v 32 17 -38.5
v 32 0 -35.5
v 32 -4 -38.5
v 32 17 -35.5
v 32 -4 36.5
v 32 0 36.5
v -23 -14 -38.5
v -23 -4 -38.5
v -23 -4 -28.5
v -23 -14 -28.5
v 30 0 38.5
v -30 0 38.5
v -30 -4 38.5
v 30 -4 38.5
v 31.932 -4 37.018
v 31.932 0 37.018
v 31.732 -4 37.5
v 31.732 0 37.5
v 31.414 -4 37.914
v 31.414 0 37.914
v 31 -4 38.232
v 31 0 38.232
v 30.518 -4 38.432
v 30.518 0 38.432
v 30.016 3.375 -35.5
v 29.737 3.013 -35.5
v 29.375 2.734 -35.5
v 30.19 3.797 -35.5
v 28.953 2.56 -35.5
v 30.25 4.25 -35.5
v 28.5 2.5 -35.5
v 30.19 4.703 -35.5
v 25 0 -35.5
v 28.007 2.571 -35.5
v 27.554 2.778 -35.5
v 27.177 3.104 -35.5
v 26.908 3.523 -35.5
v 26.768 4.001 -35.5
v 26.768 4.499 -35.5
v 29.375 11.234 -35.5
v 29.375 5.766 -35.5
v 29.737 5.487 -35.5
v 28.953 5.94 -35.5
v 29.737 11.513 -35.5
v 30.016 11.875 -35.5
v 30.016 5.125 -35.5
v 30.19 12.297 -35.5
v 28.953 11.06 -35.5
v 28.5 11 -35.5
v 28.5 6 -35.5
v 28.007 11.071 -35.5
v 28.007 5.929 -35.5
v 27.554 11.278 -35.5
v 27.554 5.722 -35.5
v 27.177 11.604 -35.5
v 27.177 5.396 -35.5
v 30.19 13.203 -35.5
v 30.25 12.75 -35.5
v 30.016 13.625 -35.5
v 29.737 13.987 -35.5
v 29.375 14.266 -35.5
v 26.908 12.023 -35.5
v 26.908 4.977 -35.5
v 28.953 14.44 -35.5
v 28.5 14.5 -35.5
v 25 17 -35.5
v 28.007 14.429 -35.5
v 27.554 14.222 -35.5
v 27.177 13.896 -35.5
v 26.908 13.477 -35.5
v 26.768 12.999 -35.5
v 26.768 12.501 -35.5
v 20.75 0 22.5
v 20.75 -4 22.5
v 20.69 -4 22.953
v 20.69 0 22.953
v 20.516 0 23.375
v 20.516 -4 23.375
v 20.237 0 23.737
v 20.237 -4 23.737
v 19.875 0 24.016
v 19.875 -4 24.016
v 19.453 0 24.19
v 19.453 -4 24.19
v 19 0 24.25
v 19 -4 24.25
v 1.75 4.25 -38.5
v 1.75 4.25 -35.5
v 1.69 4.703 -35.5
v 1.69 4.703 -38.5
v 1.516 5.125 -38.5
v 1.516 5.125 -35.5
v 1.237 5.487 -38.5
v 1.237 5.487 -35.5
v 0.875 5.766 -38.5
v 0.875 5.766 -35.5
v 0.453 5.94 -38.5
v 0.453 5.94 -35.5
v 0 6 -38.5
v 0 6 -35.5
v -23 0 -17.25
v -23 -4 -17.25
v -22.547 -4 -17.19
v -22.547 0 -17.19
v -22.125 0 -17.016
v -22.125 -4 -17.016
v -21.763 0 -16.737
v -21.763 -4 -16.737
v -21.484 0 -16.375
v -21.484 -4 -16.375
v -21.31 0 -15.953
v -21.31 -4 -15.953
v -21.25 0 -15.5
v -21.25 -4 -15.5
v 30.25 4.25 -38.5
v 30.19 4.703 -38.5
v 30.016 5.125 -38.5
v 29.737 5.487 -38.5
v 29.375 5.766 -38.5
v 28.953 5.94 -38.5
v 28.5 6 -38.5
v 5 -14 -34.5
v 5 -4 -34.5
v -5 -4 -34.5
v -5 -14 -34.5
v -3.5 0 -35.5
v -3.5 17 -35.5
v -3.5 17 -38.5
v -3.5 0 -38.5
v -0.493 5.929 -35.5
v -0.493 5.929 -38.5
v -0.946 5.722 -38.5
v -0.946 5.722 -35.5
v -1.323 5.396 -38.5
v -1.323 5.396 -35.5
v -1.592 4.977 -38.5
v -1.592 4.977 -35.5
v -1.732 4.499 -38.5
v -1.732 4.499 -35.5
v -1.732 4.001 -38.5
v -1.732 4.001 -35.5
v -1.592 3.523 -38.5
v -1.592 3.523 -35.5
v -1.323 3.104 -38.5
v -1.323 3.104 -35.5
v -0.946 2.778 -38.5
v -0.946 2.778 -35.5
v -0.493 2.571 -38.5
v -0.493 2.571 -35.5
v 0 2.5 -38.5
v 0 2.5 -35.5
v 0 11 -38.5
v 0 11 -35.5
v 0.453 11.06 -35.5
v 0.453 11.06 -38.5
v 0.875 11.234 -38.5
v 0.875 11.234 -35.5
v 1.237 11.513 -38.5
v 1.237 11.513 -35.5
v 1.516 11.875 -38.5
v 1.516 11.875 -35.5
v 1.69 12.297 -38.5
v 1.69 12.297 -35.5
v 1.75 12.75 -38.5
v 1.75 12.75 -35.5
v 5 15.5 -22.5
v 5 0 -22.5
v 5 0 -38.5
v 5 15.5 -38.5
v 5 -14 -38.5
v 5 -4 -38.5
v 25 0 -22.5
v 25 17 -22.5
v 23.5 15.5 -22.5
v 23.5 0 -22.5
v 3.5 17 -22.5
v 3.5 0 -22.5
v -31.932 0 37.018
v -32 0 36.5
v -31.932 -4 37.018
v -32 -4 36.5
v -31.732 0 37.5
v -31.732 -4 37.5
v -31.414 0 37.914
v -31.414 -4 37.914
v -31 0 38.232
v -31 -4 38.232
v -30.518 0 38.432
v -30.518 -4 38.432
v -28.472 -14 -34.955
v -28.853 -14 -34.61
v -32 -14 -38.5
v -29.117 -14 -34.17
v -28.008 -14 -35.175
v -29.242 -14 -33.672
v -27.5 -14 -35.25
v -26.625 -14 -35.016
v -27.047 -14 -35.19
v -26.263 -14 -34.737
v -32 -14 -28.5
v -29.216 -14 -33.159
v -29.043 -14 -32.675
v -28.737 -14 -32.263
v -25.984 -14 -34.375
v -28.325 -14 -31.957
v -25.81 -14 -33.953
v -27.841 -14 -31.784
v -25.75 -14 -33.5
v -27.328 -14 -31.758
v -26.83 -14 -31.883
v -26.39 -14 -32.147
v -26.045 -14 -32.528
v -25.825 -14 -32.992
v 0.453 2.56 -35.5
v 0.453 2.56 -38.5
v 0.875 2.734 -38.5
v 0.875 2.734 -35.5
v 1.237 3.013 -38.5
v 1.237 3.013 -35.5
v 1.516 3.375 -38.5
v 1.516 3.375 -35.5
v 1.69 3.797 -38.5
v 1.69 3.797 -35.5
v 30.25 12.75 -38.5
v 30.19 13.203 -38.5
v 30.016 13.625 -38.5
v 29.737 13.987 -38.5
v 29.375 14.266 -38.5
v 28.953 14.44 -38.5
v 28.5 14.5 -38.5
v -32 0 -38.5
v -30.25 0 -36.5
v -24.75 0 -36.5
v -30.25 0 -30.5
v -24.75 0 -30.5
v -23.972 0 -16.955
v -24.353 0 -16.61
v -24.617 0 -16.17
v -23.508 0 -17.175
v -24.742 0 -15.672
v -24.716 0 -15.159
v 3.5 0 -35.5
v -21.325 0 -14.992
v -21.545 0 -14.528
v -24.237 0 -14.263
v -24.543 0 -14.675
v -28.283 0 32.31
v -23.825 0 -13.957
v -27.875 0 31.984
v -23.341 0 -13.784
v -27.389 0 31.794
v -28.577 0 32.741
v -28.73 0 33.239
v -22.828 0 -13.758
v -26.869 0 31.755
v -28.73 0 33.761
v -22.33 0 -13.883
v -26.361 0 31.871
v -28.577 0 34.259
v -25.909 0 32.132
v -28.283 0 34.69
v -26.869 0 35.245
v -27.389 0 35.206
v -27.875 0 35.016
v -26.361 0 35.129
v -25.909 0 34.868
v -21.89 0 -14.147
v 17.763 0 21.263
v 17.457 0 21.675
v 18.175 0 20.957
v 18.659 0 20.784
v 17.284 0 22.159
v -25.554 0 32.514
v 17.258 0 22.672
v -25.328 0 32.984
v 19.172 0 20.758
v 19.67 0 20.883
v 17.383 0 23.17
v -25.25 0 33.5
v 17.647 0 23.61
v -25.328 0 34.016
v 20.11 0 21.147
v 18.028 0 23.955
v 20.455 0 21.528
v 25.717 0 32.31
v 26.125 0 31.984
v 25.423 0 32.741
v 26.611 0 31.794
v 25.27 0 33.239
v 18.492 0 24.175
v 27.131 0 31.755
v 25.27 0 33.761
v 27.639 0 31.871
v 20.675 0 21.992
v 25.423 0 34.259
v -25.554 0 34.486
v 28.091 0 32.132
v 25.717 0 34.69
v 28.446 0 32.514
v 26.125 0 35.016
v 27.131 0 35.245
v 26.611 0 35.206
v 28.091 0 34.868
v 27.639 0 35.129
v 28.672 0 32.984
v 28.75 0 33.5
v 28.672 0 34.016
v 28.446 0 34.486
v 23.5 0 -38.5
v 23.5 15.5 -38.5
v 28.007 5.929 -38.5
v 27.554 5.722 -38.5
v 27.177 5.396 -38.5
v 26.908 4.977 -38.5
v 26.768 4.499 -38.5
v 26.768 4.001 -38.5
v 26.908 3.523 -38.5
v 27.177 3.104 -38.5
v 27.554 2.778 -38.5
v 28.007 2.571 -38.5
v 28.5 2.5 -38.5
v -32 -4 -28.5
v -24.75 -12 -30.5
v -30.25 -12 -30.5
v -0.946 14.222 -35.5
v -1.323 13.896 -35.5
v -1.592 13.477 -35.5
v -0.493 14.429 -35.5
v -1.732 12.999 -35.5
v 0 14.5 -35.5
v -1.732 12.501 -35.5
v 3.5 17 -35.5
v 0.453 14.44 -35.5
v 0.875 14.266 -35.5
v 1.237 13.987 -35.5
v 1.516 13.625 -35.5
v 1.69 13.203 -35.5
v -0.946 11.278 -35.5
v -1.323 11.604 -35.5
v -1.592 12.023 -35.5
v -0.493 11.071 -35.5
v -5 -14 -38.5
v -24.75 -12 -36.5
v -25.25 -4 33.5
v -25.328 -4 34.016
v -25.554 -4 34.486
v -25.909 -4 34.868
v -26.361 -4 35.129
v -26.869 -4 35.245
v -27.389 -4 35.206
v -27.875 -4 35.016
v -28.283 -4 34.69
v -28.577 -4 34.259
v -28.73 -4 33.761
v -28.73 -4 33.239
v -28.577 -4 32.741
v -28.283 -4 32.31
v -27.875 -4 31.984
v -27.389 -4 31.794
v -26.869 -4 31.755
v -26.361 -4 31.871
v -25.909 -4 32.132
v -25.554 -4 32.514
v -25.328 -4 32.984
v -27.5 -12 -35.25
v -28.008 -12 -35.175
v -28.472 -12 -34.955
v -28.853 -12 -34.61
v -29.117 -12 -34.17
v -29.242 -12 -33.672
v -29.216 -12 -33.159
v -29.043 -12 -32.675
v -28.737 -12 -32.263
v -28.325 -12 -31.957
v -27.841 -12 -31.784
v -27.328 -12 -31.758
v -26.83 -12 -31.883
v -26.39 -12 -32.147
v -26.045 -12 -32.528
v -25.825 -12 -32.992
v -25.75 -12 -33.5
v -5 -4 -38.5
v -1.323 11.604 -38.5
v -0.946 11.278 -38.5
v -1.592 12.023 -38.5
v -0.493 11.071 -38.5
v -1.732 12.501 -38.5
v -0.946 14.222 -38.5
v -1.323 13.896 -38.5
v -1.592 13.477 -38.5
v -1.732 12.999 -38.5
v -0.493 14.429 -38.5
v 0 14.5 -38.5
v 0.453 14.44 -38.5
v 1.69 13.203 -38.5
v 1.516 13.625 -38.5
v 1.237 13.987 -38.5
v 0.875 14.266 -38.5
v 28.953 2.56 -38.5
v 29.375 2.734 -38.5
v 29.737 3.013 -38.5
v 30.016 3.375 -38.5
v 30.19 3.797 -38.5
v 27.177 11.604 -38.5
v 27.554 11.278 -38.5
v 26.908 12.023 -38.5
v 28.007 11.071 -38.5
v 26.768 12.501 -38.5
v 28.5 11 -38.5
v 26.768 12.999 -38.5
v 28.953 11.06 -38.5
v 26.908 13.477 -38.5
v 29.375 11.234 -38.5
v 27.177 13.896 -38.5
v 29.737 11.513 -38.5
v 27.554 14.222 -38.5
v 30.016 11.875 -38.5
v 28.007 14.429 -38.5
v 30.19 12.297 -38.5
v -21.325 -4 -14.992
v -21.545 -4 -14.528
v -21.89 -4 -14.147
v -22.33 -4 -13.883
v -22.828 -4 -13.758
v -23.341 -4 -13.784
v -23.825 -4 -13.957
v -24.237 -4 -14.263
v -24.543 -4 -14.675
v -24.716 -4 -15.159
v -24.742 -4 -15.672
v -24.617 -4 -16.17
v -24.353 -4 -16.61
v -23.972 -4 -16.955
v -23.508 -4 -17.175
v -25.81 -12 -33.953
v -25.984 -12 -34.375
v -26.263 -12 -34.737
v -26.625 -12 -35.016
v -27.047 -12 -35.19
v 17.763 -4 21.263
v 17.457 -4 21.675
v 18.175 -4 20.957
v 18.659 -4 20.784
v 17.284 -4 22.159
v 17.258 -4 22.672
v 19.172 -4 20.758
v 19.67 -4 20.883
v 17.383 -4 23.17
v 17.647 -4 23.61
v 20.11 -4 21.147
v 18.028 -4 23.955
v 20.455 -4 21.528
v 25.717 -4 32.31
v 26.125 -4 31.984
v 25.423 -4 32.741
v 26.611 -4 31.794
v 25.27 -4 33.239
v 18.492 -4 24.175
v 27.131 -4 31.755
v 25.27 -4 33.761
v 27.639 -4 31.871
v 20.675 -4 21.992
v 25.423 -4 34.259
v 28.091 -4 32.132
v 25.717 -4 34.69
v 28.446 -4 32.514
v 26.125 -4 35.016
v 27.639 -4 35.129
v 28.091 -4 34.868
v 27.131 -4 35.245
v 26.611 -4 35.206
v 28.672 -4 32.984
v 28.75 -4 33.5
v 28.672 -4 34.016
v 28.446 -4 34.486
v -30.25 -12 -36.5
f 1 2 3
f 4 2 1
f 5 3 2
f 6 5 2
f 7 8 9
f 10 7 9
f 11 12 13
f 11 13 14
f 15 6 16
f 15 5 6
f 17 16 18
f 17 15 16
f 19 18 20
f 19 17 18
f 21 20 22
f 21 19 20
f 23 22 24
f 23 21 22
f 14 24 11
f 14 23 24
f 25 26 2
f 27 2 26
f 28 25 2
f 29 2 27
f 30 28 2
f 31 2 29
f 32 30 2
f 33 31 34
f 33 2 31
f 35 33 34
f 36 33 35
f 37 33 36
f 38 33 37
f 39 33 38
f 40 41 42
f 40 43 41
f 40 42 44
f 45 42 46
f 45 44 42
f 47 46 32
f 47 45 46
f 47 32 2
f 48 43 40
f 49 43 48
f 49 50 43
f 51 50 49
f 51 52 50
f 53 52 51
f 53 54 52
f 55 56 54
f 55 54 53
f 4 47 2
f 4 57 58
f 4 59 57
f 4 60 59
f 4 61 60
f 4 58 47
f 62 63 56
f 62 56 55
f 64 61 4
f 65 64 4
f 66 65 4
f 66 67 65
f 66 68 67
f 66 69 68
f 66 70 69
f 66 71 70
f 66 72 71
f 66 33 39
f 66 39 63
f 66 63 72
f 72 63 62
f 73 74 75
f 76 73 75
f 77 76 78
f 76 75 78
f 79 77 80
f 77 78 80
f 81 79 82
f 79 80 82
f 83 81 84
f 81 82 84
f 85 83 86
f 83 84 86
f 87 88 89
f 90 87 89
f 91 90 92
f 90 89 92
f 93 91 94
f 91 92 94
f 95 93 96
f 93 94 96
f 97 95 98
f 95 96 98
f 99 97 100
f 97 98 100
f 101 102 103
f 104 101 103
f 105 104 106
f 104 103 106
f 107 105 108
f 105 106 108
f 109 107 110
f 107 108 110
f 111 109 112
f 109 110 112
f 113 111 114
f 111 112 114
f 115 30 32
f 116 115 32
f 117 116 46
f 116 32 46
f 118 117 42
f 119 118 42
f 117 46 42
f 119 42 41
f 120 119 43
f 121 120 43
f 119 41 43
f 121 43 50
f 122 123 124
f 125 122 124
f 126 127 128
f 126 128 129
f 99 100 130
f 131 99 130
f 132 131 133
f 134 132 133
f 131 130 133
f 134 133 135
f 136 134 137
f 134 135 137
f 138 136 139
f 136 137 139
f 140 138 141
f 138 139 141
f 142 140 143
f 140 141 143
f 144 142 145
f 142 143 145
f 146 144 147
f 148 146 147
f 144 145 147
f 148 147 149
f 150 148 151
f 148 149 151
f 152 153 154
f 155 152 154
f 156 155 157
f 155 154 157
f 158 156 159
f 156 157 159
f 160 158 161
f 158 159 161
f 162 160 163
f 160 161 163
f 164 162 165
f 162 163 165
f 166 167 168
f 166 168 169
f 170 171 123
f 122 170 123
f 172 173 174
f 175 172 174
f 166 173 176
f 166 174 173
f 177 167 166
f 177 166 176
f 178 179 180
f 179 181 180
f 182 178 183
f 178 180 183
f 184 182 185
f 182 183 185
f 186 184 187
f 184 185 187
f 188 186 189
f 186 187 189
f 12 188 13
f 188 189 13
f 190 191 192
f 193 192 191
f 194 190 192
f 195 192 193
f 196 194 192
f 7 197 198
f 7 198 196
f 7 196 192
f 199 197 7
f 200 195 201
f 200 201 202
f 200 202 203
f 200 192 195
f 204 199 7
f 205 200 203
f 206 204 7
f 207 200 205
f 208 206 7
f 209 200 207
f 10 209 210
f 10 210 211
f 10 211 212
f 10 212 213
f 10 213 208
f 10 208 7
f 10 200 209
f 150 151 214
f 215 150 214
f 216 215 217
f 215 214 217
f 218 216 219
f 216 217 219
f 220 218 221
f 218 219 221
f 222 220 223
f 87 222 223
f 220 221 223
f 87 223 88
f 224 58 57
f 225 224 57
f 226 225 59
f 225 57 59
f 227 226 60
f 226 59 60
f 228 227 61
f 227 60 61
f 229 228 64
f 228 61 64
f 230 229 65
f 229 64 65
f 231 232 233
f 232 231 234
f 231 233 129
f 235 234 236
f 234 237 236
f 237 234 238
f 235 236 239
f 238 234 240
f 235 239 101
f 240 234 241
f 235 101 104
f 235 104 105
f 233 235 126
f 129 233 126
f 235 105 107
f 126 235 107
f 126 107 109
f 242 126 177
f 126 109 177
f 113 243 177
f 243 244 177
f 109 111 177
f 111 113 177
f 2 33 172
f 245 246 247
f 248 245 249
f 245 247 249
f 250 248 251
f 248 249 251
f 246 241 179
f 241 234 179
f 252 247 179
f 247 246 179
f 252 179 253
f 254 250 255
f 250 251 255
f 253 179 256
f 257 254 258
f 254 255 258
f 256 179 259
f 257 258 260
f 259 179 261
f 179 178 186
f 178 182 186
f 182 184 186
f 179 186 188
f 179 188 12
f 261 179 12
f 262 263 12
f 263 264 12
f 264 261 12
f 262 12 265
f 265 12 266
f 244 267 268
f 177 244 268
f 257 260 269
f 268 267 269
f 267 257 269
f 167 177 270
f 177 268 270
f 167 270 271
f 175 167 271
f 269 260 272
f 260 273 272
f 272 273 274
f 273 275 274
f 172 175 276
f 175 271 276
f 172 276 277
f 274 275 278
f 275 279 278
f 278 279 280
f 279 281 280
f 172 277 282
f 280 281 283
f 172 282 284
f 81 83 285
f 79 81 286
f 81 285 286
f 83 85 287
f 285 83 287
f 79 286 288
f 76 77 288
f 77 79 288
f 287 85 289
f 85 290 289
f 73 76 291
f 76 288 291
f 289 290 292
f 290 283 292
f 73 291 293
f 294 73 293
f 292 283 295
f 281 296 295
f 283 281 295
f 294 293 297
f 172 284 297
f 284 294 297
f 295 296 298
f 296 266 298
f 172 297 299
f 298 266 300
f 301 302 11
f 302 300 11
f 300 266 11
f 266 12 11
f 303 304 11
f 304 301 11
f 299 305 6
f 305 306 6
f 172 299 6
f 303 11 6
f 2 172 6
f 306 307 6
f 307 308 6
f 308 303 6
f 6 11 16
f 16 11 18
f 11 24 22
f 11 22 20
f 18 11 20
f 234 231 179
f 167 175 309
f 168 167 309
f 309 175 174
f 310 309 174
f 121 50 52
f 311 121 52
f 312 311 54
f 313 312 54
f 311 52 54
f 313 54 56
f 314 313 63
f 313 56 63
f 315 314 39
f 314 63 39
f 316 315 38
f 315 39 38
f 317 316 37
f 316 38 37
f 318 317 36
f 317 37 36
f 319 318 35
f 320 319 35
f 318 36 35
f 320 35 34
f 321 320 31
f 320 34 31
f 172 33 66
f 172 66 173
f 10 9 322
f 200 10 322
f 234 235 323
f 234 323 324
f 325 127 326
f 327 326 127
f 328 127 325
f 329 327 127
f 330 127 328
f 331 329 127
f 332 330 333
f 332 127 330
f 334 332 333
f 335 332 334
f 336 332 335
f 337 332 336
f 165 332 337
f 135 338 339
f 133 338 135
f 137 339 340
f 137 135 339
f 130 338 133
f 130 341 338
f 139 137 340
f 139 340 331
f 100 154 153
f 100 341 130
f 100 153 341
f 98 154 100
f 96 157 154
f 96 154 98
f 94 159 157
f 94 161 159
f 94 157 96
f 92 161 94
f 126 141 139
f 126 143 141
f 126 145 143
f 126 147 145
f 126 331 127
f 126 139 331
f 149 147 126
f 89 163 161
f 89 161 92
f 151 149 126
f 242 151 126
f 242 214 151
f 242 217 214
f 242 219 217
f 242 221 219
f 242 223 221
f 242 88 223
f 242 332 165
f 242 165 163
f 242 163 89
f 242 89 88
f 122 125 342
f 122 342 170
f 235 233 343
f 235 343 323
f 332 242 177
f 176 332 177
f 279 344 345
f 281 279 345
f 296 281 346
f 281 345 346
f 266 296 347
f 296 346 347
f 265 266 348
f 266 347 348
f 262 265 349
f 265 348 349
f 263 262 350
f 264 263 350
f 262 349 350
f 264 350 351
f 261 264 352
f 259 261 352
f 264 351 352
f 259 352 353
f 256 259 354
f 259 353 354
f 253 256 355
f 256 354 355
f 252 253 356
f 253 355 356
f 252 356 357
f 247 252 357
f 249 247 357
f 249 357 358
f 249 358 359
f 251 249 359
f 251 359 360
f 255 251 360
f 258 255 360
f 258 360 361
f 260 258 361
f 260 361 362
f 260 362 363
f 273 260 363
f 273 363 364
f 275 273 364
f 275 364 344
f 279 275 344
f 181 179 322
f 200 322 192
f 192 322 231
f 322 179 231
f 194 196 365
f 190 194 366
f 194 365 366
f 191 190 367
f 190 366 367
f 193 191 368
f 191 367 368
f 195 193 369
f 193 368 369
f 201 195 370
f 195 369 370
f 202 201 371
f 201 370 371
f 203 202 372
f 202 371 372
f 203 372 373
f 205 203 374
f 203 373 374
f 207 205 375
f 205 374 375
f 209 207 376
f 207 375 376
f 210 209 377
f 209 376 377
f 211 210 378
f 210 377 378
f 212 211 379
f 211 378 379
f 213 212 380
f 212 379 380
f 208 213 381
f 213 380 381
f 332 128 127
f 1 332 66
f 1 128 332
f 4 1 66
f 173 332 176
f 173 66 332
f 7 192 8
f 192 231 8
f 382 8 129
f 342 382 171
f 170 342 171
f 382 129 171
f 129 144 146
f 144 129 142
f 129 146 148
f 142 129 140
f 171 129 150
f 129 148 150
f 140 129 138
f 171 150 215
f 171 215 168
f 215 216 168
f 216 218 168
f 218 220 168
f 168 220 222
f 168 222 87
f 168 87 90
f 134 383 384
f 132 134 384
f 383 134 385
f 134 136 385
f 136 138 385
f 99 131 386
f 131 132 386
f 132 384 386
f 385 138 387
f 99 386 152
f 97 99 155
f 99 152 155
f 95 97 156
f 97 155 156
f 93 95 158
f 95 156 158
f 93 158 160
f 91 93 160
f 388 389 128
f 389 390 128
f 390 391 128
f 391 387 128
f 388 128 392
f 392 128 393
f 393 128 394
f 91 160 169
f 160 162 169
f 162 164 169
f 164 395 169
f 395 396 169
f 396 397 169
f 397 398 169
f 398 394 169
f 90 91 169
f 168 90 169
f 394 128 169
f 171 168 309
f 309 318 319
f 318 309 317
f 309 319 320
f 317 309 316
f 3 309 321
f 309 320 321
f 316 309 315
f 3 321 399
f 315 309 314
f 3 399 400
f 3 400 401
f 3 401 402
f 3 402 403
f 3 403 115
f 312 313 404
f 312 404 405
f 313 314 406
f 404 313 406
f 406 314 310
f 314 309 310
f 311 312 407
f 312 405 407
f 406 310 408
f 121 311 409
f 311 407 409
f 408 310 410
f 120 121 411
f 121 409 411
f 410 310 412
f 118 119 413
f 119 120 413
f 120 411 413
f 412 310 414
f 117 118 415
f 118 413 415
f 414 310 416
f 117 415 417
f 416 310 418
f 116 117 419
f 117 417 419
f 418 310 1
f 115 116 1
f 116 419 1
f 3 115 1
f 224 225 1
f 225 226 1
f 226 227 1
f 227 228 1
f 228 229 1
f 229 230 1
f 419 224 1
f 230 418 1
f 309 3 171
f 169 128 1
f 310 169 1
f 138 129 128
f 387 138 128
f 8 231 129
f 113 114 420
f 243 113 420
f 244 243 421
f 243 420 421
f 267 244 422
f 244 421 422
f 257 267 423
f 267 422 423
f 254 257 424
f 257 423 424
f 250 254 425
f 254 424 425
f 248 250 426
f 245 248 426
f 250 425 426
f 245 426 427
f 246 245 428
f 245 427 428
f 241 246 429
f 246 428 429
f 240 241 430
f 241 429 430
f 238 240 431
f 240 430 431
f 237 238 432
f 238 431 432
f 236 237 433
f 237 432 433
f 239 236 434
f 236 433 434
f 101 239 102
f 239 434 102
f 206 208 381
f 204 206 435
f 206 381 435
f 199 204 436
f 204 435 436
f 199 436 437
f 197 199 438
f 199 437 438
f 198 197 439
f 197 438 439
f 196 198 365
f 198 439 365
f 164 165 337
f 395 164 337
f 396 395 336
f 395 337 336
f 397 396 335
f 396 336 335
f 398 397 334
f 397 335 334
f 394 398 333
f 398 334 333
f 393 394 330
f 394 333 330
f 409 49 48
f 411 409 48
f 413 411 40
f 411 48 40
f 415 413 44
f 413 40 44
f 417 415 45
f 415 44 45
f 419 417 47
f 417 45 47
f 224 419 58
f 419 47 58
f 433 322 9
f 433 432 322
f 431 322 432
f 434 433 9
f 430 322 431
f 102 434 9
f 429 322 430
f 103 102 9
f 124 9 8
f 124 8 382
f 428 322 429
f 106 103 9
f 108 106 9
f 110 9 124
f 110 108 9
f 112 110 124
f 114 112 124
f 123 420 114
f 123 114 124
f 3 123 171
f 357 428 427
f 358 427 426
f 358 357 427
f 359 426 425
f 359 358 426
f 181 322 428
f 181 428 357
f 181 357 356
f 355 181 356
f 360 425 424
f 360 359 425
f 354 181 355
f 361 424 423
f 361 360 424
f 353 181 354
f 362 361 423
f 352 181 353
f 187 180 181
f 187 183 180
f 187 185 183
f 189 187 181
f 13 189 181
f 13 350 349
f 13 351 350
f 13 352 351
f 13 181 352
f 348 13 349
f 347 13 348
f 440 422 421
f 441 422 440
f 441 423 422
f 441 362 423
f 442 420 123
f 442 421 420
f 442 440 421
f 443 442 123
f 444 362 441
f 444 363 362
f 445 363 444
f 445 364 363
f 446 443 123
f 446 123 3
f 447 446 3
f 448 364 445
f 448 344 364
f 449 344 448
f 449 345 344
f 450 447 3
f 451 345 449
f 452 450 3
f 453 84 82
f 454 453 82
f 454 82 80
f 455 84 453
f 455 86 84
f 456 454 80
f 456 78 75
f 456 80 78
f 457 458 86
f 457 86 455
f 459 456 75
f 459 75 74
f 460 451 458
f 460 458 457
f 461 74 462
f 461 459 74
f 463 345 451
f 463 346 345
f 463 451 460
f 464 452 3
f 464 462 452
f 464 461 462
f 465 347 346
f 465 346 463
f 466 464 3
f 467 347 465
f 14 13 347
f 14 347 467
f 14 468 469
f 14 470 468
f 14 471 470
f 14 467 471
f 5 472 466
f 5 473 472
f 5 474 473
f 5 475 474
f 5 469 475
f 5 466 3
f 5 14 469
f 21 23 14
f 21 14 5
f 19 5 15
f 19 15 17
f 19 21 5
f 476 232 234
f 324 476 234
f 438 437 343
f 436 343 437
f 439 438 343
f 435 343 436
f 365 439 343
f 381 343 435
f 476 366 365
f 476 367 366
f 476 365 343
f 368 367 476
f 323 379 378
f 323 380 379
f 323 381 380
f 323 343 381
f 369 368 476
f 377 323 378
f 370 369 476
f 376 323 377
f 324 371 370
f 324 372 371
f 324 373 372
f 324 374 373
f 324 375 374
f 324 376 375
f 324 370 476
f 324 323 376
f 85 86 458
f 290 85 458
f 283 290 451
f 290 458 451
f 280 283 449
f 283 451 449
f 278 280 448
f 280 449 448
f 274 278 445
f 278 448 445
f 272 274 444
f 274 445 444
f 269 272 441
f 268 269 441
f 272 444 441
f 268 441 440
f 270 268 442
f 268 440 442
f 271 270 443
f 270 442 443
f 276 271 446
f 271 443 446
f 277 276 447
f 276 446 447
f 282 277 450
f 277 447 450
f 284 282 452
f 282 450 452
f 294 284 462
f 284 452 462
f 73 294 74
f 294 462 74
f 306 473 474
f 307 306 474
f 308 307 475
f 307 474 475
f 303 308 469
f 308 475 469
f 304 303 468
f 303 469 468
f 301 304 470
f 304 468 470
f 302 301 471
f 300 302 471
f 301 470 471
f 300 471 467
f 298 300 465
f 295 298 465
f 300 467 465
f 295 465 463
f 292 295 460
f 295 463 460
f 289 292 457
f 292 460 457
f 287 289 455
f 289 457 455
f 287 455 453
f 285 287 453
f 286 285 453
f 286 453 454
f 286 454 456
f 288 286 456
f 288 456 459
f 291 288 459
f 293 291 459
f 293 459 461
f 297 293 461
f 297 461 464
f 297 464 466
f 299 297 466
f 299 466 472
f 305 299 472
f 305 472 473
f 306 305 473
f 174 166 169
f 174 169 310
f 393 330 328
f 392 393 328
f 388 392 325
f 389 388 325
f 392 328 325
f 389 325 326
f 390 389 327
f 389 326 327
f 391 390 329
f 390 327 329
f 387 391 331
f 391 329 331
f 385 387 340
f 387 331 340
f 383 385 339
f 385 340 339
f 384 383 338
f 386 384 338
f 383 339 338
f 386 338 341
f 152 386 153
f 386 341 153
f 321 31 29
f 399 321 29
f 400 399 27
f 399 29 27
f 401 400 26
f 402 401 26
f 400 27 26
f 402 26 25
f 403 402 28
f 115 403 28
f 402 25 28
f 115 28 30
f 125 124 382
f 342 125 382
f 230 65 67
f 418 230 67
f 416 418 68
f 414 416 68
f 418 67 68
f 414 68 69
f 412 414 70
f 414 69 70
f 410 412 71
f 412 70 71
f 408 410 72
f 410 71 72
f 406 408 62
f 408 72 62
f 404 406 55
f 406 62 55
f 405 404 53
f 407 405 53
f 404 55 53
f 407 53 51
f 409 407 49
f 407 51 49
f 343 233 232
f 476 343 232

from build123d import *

# Parameters (mm, degrees)
F0_W      = 64
F0_H      = 77
F1_DEPTH  = 4
F2_R      = 1.75
F3_DEPTH  = 25
F5_DEPTH  = 10
F7_DEPTH  = 25
F8_W      = 21.5
F8_H      = 16
F9_DEPTH  = 17
F10_W     = 18.5
F10_H     = 15.5
F11_DEPTH = 25
F12_W     = 17
F12_H     = 3
F13_DEPTH = 7
F14_W     = 17
F14_H     = 3
F15_DEPTH = 7
F17_DEPTH = 25
F19_DEPTH = 25
F21_DEPTH = 10
F22_DEPTH = 25
F23_W     = 5.5
F23_H     = 6
F23_R     = 1.75
F24_DEPTH = 12
F25_R     = 2


# Not quite as in the source:
# - a feature names something its author has since deleted; it is built from what else it names


with BuildPart() as f1:
    # F0 (on Front) → F1 (new body)
    with BuildSketch(Plane.XZ):
        Rectangle(F0_W, F0_H)
    extrude(amount=F1_DEPTH)

    # F2 (on face) → F3 (cut)
    with BuildSketch(Plane.XZ.offset(4)):
        with BuildLine():
            ThreePointArc((-28.75, 33.5), (-27, 31.75), (-25.25, 33.5))
            ThreePointArc((-25.25, 33.5), (-27, 35.25), (-28.75, 33.5))
        make_face()
        with Locations((27, 33.5)):
            Circle(F2_R)
    extrude(amount=-F3_DEPTH, mode=Mode.SUBTRACT)

    # F4 (on face) → F5 (join)
    with BuildSketch(Plane.XZ.offset(4)):
        Polygon((-5, -34.5), (-5, -38.5), (0, -38.5), (5, -38.5), (5, -34.5), align=None)
    extrude(amount=F5_DEPTH)

    # F6 (on face) → F7 (cut)
    with BuildSketch(Plane.XZ.offset(4)):
        with BuildLine():
            Line((19, 22.5), (19, 24.25))
            ThreePointArc((19, 24.25), (17.7625631329, 21.2625631329), (20.75, 22.5))
            Line((20.75, 22.5), (19, 22.5))
        make_face()
        with BuildLine():
            ThreePointArc((20.75, 22.5), (20.2374368671, 23.7374368671), (19, 24.25))
            Line((19, 24.25), (19, 22.5))
            Line((19, 22.5), (20.75, 22.5))
        make_face()
        with BuildLine():
            ThreePointArc((-21.25, -15.5), (-24.2374368671, -14.2625631329), (-23, -17.25))
            ThreePointArc((-23, -17.25), (-21.7625631329, -16.7374368671), (-21.25, -15.5))
        make_face()
    extrude(amount=-F7_DEPTH, mode=Mode.SUBTRACT)

    # F8 (on face) → F9 (join)
    with BuildSketch(Plane(origin=(0, 0, 0), x_dir=(-1, 0, 0), z_dir=(0, 1, 0))):
        with Locations((-14.25, -30.5)):
            Rectangle(F8_W, F8_H)
    extrude(amount=F9_DEPTH)

    # F10 (on face) → F11 (cut)
    with BuildSketch(Plane.XY.offset(-22.5)):
        with Locations((14.25, 7.75)):
            Rectangle(F10_W, F10_H)
    extrude(amount=-F11_DEPTH, mode=Mode.SUBTRACT)

    # F12 (on face) → F13 (join)
    with BuildSketch(Plane.YZ.offset(25)):
        with Locations((8.5, -37)):
            Rectangle(F12_W, F12_H)
    extrude(amount=F13_DEPTH)

    # F14 (on face) → F15 (join)
    with BuildSketch(Plane(origin=(3.5, 0, 0), x_dir=(0, -1, 0), z_dir=(-1, 0, 0))):
        with Locations((-8.5, -37)):
            Rectangle(F14_W, F14_H)
    extrude(amount=F15_DEPTH)

    # F16 (on face) → F17 (cut)
    with BuildSketch(Plane.XY.offset(-35.5)):
        with BuildLine():
            Line((0, 14.5), (0, 11))
            ThreePointArc((0, 11), (1.2374368671, 11.5125631329), (1.75, 12.75))
            ThreePointArc((1.75, 12.75), (1.2374368671, 13.9874368671), (0, 14.5))
        make_face()
        with BuildLine():
            ThreePointArc((0, 14.5), (-1.75, 12.75), (0, 11))
            Line((0, 11), (0, 14.5))
        make_face()
        with BuildLine():
            ThreePointArc((0, 6), (-1.75, 4.25), (0, 2.5))
            Line((0, 2.5), (0, 6))
        make_face()
        with BuildLine():
            Line((0, 6), (0, 2.5))
            ThreePointArc((0, 2.5), (1.2374368671, 3.0125631329), (1.75, 4.25))
            ThreePointArc((1.75, 4.25), (1.2374368671, 5.4874368671), (0, 6))
        make_face()
    extrude(amount=-F17_DEPTH, mode=Mode.SUBTRACT)

    # F18 (on face) → F19 (cut)
    with BuildSketch(Plane.XY.offset(-35.5)):
        with BuildLine():
            ThreePointArc((30.25, 12.75), (29.7374368671, 13.9874368671), (28.5, 14.5))
            Line((28.5, 14.5), (28.5, 11))
            ThreePointArc((28.5, 11), (29.7374368671, 11.5125631329), (30.25, 12.75))
        make_face()
        with BuildLine():
            ThreePointArc((30.25, 4.25), (29.7374368671, 5.4874368671), (28.5, 6))
            Line((28.5, 6), (28.5, 2.5))
            ThreePointArc((28.5, 2.5), (29.7374368671, 3.0125631329), (30.25, 4.25))
        make_face()
        with BuildLine():
            Line((28.5, 2.5), (28.5, 6))
            ThreePointArc((28.5, 6), (26.75, 4.25), (28.5, 2.5))
        make_face()
        with BuildLine():
            Line((28.5, 11), (28.5, 14.5))
            ThreePointArc((28.5, 14.5), (26.75, 12.75), (28.5, 11))
        make_face()
    extrude(amount=-F19_DEPTH, mode=Mode.SUBTRACT)

    # F20 (on face) → F21 (join)
    with BuildSketch(Plane.XZ.offset(4)):
        Polygon((-32, -28.5), (-32, -38.5), (-27.5, -38.5), (-23, -38.5), (-23, -28.5), align=None)
        with BuildLine():
            ThreePointArc((-25.75, -33.5), (-26.2625631329, -34.7374368671), (-27.5, -35.25))
            ThreePointArc((-27.5, -35.25), (-28.7374368671, -32.2625631329), (-25.75, -33.5))
        make_face(mode=Mode.SUBTRACT)
    extrude(amount=F21_DEPTH)

    # F22 (cut): a face of the model
    f22_faces = [f1.faces().sort_by_distance(p)[0] for p in [
        (-27.5, -4, -33.5),
    ]]
    extrude(f22_faces, amount=-F22_DEPTH, mode=Mode.SUBTRACT)

    # F23 (on face) → F24 (cut)
    with BuildSketch(Plane(origin=(0, 0, 0), x_dir=(-1, 0, 0), z_dir=(0, 1, 0))):
        with Locations((27.5, -33.5)):
            Rectangle(F23_W, F23_H)
        with Locations((27.5, -33.5)):
            Circle(F23_R, mode=Mode.SUBTRACT)
    extrude(amount=-F24_DEPTH, mode=Mode.SUBTRACT)

    # F25
    f25_edges = [f1.edges().sort_by_distance(p)[0] for p in [
        (-32, -2, 38.5),
        (32, -2, 38.5),
    ]]
    fillet(f25_edges, radius=F25_R)


solid = f1.part
